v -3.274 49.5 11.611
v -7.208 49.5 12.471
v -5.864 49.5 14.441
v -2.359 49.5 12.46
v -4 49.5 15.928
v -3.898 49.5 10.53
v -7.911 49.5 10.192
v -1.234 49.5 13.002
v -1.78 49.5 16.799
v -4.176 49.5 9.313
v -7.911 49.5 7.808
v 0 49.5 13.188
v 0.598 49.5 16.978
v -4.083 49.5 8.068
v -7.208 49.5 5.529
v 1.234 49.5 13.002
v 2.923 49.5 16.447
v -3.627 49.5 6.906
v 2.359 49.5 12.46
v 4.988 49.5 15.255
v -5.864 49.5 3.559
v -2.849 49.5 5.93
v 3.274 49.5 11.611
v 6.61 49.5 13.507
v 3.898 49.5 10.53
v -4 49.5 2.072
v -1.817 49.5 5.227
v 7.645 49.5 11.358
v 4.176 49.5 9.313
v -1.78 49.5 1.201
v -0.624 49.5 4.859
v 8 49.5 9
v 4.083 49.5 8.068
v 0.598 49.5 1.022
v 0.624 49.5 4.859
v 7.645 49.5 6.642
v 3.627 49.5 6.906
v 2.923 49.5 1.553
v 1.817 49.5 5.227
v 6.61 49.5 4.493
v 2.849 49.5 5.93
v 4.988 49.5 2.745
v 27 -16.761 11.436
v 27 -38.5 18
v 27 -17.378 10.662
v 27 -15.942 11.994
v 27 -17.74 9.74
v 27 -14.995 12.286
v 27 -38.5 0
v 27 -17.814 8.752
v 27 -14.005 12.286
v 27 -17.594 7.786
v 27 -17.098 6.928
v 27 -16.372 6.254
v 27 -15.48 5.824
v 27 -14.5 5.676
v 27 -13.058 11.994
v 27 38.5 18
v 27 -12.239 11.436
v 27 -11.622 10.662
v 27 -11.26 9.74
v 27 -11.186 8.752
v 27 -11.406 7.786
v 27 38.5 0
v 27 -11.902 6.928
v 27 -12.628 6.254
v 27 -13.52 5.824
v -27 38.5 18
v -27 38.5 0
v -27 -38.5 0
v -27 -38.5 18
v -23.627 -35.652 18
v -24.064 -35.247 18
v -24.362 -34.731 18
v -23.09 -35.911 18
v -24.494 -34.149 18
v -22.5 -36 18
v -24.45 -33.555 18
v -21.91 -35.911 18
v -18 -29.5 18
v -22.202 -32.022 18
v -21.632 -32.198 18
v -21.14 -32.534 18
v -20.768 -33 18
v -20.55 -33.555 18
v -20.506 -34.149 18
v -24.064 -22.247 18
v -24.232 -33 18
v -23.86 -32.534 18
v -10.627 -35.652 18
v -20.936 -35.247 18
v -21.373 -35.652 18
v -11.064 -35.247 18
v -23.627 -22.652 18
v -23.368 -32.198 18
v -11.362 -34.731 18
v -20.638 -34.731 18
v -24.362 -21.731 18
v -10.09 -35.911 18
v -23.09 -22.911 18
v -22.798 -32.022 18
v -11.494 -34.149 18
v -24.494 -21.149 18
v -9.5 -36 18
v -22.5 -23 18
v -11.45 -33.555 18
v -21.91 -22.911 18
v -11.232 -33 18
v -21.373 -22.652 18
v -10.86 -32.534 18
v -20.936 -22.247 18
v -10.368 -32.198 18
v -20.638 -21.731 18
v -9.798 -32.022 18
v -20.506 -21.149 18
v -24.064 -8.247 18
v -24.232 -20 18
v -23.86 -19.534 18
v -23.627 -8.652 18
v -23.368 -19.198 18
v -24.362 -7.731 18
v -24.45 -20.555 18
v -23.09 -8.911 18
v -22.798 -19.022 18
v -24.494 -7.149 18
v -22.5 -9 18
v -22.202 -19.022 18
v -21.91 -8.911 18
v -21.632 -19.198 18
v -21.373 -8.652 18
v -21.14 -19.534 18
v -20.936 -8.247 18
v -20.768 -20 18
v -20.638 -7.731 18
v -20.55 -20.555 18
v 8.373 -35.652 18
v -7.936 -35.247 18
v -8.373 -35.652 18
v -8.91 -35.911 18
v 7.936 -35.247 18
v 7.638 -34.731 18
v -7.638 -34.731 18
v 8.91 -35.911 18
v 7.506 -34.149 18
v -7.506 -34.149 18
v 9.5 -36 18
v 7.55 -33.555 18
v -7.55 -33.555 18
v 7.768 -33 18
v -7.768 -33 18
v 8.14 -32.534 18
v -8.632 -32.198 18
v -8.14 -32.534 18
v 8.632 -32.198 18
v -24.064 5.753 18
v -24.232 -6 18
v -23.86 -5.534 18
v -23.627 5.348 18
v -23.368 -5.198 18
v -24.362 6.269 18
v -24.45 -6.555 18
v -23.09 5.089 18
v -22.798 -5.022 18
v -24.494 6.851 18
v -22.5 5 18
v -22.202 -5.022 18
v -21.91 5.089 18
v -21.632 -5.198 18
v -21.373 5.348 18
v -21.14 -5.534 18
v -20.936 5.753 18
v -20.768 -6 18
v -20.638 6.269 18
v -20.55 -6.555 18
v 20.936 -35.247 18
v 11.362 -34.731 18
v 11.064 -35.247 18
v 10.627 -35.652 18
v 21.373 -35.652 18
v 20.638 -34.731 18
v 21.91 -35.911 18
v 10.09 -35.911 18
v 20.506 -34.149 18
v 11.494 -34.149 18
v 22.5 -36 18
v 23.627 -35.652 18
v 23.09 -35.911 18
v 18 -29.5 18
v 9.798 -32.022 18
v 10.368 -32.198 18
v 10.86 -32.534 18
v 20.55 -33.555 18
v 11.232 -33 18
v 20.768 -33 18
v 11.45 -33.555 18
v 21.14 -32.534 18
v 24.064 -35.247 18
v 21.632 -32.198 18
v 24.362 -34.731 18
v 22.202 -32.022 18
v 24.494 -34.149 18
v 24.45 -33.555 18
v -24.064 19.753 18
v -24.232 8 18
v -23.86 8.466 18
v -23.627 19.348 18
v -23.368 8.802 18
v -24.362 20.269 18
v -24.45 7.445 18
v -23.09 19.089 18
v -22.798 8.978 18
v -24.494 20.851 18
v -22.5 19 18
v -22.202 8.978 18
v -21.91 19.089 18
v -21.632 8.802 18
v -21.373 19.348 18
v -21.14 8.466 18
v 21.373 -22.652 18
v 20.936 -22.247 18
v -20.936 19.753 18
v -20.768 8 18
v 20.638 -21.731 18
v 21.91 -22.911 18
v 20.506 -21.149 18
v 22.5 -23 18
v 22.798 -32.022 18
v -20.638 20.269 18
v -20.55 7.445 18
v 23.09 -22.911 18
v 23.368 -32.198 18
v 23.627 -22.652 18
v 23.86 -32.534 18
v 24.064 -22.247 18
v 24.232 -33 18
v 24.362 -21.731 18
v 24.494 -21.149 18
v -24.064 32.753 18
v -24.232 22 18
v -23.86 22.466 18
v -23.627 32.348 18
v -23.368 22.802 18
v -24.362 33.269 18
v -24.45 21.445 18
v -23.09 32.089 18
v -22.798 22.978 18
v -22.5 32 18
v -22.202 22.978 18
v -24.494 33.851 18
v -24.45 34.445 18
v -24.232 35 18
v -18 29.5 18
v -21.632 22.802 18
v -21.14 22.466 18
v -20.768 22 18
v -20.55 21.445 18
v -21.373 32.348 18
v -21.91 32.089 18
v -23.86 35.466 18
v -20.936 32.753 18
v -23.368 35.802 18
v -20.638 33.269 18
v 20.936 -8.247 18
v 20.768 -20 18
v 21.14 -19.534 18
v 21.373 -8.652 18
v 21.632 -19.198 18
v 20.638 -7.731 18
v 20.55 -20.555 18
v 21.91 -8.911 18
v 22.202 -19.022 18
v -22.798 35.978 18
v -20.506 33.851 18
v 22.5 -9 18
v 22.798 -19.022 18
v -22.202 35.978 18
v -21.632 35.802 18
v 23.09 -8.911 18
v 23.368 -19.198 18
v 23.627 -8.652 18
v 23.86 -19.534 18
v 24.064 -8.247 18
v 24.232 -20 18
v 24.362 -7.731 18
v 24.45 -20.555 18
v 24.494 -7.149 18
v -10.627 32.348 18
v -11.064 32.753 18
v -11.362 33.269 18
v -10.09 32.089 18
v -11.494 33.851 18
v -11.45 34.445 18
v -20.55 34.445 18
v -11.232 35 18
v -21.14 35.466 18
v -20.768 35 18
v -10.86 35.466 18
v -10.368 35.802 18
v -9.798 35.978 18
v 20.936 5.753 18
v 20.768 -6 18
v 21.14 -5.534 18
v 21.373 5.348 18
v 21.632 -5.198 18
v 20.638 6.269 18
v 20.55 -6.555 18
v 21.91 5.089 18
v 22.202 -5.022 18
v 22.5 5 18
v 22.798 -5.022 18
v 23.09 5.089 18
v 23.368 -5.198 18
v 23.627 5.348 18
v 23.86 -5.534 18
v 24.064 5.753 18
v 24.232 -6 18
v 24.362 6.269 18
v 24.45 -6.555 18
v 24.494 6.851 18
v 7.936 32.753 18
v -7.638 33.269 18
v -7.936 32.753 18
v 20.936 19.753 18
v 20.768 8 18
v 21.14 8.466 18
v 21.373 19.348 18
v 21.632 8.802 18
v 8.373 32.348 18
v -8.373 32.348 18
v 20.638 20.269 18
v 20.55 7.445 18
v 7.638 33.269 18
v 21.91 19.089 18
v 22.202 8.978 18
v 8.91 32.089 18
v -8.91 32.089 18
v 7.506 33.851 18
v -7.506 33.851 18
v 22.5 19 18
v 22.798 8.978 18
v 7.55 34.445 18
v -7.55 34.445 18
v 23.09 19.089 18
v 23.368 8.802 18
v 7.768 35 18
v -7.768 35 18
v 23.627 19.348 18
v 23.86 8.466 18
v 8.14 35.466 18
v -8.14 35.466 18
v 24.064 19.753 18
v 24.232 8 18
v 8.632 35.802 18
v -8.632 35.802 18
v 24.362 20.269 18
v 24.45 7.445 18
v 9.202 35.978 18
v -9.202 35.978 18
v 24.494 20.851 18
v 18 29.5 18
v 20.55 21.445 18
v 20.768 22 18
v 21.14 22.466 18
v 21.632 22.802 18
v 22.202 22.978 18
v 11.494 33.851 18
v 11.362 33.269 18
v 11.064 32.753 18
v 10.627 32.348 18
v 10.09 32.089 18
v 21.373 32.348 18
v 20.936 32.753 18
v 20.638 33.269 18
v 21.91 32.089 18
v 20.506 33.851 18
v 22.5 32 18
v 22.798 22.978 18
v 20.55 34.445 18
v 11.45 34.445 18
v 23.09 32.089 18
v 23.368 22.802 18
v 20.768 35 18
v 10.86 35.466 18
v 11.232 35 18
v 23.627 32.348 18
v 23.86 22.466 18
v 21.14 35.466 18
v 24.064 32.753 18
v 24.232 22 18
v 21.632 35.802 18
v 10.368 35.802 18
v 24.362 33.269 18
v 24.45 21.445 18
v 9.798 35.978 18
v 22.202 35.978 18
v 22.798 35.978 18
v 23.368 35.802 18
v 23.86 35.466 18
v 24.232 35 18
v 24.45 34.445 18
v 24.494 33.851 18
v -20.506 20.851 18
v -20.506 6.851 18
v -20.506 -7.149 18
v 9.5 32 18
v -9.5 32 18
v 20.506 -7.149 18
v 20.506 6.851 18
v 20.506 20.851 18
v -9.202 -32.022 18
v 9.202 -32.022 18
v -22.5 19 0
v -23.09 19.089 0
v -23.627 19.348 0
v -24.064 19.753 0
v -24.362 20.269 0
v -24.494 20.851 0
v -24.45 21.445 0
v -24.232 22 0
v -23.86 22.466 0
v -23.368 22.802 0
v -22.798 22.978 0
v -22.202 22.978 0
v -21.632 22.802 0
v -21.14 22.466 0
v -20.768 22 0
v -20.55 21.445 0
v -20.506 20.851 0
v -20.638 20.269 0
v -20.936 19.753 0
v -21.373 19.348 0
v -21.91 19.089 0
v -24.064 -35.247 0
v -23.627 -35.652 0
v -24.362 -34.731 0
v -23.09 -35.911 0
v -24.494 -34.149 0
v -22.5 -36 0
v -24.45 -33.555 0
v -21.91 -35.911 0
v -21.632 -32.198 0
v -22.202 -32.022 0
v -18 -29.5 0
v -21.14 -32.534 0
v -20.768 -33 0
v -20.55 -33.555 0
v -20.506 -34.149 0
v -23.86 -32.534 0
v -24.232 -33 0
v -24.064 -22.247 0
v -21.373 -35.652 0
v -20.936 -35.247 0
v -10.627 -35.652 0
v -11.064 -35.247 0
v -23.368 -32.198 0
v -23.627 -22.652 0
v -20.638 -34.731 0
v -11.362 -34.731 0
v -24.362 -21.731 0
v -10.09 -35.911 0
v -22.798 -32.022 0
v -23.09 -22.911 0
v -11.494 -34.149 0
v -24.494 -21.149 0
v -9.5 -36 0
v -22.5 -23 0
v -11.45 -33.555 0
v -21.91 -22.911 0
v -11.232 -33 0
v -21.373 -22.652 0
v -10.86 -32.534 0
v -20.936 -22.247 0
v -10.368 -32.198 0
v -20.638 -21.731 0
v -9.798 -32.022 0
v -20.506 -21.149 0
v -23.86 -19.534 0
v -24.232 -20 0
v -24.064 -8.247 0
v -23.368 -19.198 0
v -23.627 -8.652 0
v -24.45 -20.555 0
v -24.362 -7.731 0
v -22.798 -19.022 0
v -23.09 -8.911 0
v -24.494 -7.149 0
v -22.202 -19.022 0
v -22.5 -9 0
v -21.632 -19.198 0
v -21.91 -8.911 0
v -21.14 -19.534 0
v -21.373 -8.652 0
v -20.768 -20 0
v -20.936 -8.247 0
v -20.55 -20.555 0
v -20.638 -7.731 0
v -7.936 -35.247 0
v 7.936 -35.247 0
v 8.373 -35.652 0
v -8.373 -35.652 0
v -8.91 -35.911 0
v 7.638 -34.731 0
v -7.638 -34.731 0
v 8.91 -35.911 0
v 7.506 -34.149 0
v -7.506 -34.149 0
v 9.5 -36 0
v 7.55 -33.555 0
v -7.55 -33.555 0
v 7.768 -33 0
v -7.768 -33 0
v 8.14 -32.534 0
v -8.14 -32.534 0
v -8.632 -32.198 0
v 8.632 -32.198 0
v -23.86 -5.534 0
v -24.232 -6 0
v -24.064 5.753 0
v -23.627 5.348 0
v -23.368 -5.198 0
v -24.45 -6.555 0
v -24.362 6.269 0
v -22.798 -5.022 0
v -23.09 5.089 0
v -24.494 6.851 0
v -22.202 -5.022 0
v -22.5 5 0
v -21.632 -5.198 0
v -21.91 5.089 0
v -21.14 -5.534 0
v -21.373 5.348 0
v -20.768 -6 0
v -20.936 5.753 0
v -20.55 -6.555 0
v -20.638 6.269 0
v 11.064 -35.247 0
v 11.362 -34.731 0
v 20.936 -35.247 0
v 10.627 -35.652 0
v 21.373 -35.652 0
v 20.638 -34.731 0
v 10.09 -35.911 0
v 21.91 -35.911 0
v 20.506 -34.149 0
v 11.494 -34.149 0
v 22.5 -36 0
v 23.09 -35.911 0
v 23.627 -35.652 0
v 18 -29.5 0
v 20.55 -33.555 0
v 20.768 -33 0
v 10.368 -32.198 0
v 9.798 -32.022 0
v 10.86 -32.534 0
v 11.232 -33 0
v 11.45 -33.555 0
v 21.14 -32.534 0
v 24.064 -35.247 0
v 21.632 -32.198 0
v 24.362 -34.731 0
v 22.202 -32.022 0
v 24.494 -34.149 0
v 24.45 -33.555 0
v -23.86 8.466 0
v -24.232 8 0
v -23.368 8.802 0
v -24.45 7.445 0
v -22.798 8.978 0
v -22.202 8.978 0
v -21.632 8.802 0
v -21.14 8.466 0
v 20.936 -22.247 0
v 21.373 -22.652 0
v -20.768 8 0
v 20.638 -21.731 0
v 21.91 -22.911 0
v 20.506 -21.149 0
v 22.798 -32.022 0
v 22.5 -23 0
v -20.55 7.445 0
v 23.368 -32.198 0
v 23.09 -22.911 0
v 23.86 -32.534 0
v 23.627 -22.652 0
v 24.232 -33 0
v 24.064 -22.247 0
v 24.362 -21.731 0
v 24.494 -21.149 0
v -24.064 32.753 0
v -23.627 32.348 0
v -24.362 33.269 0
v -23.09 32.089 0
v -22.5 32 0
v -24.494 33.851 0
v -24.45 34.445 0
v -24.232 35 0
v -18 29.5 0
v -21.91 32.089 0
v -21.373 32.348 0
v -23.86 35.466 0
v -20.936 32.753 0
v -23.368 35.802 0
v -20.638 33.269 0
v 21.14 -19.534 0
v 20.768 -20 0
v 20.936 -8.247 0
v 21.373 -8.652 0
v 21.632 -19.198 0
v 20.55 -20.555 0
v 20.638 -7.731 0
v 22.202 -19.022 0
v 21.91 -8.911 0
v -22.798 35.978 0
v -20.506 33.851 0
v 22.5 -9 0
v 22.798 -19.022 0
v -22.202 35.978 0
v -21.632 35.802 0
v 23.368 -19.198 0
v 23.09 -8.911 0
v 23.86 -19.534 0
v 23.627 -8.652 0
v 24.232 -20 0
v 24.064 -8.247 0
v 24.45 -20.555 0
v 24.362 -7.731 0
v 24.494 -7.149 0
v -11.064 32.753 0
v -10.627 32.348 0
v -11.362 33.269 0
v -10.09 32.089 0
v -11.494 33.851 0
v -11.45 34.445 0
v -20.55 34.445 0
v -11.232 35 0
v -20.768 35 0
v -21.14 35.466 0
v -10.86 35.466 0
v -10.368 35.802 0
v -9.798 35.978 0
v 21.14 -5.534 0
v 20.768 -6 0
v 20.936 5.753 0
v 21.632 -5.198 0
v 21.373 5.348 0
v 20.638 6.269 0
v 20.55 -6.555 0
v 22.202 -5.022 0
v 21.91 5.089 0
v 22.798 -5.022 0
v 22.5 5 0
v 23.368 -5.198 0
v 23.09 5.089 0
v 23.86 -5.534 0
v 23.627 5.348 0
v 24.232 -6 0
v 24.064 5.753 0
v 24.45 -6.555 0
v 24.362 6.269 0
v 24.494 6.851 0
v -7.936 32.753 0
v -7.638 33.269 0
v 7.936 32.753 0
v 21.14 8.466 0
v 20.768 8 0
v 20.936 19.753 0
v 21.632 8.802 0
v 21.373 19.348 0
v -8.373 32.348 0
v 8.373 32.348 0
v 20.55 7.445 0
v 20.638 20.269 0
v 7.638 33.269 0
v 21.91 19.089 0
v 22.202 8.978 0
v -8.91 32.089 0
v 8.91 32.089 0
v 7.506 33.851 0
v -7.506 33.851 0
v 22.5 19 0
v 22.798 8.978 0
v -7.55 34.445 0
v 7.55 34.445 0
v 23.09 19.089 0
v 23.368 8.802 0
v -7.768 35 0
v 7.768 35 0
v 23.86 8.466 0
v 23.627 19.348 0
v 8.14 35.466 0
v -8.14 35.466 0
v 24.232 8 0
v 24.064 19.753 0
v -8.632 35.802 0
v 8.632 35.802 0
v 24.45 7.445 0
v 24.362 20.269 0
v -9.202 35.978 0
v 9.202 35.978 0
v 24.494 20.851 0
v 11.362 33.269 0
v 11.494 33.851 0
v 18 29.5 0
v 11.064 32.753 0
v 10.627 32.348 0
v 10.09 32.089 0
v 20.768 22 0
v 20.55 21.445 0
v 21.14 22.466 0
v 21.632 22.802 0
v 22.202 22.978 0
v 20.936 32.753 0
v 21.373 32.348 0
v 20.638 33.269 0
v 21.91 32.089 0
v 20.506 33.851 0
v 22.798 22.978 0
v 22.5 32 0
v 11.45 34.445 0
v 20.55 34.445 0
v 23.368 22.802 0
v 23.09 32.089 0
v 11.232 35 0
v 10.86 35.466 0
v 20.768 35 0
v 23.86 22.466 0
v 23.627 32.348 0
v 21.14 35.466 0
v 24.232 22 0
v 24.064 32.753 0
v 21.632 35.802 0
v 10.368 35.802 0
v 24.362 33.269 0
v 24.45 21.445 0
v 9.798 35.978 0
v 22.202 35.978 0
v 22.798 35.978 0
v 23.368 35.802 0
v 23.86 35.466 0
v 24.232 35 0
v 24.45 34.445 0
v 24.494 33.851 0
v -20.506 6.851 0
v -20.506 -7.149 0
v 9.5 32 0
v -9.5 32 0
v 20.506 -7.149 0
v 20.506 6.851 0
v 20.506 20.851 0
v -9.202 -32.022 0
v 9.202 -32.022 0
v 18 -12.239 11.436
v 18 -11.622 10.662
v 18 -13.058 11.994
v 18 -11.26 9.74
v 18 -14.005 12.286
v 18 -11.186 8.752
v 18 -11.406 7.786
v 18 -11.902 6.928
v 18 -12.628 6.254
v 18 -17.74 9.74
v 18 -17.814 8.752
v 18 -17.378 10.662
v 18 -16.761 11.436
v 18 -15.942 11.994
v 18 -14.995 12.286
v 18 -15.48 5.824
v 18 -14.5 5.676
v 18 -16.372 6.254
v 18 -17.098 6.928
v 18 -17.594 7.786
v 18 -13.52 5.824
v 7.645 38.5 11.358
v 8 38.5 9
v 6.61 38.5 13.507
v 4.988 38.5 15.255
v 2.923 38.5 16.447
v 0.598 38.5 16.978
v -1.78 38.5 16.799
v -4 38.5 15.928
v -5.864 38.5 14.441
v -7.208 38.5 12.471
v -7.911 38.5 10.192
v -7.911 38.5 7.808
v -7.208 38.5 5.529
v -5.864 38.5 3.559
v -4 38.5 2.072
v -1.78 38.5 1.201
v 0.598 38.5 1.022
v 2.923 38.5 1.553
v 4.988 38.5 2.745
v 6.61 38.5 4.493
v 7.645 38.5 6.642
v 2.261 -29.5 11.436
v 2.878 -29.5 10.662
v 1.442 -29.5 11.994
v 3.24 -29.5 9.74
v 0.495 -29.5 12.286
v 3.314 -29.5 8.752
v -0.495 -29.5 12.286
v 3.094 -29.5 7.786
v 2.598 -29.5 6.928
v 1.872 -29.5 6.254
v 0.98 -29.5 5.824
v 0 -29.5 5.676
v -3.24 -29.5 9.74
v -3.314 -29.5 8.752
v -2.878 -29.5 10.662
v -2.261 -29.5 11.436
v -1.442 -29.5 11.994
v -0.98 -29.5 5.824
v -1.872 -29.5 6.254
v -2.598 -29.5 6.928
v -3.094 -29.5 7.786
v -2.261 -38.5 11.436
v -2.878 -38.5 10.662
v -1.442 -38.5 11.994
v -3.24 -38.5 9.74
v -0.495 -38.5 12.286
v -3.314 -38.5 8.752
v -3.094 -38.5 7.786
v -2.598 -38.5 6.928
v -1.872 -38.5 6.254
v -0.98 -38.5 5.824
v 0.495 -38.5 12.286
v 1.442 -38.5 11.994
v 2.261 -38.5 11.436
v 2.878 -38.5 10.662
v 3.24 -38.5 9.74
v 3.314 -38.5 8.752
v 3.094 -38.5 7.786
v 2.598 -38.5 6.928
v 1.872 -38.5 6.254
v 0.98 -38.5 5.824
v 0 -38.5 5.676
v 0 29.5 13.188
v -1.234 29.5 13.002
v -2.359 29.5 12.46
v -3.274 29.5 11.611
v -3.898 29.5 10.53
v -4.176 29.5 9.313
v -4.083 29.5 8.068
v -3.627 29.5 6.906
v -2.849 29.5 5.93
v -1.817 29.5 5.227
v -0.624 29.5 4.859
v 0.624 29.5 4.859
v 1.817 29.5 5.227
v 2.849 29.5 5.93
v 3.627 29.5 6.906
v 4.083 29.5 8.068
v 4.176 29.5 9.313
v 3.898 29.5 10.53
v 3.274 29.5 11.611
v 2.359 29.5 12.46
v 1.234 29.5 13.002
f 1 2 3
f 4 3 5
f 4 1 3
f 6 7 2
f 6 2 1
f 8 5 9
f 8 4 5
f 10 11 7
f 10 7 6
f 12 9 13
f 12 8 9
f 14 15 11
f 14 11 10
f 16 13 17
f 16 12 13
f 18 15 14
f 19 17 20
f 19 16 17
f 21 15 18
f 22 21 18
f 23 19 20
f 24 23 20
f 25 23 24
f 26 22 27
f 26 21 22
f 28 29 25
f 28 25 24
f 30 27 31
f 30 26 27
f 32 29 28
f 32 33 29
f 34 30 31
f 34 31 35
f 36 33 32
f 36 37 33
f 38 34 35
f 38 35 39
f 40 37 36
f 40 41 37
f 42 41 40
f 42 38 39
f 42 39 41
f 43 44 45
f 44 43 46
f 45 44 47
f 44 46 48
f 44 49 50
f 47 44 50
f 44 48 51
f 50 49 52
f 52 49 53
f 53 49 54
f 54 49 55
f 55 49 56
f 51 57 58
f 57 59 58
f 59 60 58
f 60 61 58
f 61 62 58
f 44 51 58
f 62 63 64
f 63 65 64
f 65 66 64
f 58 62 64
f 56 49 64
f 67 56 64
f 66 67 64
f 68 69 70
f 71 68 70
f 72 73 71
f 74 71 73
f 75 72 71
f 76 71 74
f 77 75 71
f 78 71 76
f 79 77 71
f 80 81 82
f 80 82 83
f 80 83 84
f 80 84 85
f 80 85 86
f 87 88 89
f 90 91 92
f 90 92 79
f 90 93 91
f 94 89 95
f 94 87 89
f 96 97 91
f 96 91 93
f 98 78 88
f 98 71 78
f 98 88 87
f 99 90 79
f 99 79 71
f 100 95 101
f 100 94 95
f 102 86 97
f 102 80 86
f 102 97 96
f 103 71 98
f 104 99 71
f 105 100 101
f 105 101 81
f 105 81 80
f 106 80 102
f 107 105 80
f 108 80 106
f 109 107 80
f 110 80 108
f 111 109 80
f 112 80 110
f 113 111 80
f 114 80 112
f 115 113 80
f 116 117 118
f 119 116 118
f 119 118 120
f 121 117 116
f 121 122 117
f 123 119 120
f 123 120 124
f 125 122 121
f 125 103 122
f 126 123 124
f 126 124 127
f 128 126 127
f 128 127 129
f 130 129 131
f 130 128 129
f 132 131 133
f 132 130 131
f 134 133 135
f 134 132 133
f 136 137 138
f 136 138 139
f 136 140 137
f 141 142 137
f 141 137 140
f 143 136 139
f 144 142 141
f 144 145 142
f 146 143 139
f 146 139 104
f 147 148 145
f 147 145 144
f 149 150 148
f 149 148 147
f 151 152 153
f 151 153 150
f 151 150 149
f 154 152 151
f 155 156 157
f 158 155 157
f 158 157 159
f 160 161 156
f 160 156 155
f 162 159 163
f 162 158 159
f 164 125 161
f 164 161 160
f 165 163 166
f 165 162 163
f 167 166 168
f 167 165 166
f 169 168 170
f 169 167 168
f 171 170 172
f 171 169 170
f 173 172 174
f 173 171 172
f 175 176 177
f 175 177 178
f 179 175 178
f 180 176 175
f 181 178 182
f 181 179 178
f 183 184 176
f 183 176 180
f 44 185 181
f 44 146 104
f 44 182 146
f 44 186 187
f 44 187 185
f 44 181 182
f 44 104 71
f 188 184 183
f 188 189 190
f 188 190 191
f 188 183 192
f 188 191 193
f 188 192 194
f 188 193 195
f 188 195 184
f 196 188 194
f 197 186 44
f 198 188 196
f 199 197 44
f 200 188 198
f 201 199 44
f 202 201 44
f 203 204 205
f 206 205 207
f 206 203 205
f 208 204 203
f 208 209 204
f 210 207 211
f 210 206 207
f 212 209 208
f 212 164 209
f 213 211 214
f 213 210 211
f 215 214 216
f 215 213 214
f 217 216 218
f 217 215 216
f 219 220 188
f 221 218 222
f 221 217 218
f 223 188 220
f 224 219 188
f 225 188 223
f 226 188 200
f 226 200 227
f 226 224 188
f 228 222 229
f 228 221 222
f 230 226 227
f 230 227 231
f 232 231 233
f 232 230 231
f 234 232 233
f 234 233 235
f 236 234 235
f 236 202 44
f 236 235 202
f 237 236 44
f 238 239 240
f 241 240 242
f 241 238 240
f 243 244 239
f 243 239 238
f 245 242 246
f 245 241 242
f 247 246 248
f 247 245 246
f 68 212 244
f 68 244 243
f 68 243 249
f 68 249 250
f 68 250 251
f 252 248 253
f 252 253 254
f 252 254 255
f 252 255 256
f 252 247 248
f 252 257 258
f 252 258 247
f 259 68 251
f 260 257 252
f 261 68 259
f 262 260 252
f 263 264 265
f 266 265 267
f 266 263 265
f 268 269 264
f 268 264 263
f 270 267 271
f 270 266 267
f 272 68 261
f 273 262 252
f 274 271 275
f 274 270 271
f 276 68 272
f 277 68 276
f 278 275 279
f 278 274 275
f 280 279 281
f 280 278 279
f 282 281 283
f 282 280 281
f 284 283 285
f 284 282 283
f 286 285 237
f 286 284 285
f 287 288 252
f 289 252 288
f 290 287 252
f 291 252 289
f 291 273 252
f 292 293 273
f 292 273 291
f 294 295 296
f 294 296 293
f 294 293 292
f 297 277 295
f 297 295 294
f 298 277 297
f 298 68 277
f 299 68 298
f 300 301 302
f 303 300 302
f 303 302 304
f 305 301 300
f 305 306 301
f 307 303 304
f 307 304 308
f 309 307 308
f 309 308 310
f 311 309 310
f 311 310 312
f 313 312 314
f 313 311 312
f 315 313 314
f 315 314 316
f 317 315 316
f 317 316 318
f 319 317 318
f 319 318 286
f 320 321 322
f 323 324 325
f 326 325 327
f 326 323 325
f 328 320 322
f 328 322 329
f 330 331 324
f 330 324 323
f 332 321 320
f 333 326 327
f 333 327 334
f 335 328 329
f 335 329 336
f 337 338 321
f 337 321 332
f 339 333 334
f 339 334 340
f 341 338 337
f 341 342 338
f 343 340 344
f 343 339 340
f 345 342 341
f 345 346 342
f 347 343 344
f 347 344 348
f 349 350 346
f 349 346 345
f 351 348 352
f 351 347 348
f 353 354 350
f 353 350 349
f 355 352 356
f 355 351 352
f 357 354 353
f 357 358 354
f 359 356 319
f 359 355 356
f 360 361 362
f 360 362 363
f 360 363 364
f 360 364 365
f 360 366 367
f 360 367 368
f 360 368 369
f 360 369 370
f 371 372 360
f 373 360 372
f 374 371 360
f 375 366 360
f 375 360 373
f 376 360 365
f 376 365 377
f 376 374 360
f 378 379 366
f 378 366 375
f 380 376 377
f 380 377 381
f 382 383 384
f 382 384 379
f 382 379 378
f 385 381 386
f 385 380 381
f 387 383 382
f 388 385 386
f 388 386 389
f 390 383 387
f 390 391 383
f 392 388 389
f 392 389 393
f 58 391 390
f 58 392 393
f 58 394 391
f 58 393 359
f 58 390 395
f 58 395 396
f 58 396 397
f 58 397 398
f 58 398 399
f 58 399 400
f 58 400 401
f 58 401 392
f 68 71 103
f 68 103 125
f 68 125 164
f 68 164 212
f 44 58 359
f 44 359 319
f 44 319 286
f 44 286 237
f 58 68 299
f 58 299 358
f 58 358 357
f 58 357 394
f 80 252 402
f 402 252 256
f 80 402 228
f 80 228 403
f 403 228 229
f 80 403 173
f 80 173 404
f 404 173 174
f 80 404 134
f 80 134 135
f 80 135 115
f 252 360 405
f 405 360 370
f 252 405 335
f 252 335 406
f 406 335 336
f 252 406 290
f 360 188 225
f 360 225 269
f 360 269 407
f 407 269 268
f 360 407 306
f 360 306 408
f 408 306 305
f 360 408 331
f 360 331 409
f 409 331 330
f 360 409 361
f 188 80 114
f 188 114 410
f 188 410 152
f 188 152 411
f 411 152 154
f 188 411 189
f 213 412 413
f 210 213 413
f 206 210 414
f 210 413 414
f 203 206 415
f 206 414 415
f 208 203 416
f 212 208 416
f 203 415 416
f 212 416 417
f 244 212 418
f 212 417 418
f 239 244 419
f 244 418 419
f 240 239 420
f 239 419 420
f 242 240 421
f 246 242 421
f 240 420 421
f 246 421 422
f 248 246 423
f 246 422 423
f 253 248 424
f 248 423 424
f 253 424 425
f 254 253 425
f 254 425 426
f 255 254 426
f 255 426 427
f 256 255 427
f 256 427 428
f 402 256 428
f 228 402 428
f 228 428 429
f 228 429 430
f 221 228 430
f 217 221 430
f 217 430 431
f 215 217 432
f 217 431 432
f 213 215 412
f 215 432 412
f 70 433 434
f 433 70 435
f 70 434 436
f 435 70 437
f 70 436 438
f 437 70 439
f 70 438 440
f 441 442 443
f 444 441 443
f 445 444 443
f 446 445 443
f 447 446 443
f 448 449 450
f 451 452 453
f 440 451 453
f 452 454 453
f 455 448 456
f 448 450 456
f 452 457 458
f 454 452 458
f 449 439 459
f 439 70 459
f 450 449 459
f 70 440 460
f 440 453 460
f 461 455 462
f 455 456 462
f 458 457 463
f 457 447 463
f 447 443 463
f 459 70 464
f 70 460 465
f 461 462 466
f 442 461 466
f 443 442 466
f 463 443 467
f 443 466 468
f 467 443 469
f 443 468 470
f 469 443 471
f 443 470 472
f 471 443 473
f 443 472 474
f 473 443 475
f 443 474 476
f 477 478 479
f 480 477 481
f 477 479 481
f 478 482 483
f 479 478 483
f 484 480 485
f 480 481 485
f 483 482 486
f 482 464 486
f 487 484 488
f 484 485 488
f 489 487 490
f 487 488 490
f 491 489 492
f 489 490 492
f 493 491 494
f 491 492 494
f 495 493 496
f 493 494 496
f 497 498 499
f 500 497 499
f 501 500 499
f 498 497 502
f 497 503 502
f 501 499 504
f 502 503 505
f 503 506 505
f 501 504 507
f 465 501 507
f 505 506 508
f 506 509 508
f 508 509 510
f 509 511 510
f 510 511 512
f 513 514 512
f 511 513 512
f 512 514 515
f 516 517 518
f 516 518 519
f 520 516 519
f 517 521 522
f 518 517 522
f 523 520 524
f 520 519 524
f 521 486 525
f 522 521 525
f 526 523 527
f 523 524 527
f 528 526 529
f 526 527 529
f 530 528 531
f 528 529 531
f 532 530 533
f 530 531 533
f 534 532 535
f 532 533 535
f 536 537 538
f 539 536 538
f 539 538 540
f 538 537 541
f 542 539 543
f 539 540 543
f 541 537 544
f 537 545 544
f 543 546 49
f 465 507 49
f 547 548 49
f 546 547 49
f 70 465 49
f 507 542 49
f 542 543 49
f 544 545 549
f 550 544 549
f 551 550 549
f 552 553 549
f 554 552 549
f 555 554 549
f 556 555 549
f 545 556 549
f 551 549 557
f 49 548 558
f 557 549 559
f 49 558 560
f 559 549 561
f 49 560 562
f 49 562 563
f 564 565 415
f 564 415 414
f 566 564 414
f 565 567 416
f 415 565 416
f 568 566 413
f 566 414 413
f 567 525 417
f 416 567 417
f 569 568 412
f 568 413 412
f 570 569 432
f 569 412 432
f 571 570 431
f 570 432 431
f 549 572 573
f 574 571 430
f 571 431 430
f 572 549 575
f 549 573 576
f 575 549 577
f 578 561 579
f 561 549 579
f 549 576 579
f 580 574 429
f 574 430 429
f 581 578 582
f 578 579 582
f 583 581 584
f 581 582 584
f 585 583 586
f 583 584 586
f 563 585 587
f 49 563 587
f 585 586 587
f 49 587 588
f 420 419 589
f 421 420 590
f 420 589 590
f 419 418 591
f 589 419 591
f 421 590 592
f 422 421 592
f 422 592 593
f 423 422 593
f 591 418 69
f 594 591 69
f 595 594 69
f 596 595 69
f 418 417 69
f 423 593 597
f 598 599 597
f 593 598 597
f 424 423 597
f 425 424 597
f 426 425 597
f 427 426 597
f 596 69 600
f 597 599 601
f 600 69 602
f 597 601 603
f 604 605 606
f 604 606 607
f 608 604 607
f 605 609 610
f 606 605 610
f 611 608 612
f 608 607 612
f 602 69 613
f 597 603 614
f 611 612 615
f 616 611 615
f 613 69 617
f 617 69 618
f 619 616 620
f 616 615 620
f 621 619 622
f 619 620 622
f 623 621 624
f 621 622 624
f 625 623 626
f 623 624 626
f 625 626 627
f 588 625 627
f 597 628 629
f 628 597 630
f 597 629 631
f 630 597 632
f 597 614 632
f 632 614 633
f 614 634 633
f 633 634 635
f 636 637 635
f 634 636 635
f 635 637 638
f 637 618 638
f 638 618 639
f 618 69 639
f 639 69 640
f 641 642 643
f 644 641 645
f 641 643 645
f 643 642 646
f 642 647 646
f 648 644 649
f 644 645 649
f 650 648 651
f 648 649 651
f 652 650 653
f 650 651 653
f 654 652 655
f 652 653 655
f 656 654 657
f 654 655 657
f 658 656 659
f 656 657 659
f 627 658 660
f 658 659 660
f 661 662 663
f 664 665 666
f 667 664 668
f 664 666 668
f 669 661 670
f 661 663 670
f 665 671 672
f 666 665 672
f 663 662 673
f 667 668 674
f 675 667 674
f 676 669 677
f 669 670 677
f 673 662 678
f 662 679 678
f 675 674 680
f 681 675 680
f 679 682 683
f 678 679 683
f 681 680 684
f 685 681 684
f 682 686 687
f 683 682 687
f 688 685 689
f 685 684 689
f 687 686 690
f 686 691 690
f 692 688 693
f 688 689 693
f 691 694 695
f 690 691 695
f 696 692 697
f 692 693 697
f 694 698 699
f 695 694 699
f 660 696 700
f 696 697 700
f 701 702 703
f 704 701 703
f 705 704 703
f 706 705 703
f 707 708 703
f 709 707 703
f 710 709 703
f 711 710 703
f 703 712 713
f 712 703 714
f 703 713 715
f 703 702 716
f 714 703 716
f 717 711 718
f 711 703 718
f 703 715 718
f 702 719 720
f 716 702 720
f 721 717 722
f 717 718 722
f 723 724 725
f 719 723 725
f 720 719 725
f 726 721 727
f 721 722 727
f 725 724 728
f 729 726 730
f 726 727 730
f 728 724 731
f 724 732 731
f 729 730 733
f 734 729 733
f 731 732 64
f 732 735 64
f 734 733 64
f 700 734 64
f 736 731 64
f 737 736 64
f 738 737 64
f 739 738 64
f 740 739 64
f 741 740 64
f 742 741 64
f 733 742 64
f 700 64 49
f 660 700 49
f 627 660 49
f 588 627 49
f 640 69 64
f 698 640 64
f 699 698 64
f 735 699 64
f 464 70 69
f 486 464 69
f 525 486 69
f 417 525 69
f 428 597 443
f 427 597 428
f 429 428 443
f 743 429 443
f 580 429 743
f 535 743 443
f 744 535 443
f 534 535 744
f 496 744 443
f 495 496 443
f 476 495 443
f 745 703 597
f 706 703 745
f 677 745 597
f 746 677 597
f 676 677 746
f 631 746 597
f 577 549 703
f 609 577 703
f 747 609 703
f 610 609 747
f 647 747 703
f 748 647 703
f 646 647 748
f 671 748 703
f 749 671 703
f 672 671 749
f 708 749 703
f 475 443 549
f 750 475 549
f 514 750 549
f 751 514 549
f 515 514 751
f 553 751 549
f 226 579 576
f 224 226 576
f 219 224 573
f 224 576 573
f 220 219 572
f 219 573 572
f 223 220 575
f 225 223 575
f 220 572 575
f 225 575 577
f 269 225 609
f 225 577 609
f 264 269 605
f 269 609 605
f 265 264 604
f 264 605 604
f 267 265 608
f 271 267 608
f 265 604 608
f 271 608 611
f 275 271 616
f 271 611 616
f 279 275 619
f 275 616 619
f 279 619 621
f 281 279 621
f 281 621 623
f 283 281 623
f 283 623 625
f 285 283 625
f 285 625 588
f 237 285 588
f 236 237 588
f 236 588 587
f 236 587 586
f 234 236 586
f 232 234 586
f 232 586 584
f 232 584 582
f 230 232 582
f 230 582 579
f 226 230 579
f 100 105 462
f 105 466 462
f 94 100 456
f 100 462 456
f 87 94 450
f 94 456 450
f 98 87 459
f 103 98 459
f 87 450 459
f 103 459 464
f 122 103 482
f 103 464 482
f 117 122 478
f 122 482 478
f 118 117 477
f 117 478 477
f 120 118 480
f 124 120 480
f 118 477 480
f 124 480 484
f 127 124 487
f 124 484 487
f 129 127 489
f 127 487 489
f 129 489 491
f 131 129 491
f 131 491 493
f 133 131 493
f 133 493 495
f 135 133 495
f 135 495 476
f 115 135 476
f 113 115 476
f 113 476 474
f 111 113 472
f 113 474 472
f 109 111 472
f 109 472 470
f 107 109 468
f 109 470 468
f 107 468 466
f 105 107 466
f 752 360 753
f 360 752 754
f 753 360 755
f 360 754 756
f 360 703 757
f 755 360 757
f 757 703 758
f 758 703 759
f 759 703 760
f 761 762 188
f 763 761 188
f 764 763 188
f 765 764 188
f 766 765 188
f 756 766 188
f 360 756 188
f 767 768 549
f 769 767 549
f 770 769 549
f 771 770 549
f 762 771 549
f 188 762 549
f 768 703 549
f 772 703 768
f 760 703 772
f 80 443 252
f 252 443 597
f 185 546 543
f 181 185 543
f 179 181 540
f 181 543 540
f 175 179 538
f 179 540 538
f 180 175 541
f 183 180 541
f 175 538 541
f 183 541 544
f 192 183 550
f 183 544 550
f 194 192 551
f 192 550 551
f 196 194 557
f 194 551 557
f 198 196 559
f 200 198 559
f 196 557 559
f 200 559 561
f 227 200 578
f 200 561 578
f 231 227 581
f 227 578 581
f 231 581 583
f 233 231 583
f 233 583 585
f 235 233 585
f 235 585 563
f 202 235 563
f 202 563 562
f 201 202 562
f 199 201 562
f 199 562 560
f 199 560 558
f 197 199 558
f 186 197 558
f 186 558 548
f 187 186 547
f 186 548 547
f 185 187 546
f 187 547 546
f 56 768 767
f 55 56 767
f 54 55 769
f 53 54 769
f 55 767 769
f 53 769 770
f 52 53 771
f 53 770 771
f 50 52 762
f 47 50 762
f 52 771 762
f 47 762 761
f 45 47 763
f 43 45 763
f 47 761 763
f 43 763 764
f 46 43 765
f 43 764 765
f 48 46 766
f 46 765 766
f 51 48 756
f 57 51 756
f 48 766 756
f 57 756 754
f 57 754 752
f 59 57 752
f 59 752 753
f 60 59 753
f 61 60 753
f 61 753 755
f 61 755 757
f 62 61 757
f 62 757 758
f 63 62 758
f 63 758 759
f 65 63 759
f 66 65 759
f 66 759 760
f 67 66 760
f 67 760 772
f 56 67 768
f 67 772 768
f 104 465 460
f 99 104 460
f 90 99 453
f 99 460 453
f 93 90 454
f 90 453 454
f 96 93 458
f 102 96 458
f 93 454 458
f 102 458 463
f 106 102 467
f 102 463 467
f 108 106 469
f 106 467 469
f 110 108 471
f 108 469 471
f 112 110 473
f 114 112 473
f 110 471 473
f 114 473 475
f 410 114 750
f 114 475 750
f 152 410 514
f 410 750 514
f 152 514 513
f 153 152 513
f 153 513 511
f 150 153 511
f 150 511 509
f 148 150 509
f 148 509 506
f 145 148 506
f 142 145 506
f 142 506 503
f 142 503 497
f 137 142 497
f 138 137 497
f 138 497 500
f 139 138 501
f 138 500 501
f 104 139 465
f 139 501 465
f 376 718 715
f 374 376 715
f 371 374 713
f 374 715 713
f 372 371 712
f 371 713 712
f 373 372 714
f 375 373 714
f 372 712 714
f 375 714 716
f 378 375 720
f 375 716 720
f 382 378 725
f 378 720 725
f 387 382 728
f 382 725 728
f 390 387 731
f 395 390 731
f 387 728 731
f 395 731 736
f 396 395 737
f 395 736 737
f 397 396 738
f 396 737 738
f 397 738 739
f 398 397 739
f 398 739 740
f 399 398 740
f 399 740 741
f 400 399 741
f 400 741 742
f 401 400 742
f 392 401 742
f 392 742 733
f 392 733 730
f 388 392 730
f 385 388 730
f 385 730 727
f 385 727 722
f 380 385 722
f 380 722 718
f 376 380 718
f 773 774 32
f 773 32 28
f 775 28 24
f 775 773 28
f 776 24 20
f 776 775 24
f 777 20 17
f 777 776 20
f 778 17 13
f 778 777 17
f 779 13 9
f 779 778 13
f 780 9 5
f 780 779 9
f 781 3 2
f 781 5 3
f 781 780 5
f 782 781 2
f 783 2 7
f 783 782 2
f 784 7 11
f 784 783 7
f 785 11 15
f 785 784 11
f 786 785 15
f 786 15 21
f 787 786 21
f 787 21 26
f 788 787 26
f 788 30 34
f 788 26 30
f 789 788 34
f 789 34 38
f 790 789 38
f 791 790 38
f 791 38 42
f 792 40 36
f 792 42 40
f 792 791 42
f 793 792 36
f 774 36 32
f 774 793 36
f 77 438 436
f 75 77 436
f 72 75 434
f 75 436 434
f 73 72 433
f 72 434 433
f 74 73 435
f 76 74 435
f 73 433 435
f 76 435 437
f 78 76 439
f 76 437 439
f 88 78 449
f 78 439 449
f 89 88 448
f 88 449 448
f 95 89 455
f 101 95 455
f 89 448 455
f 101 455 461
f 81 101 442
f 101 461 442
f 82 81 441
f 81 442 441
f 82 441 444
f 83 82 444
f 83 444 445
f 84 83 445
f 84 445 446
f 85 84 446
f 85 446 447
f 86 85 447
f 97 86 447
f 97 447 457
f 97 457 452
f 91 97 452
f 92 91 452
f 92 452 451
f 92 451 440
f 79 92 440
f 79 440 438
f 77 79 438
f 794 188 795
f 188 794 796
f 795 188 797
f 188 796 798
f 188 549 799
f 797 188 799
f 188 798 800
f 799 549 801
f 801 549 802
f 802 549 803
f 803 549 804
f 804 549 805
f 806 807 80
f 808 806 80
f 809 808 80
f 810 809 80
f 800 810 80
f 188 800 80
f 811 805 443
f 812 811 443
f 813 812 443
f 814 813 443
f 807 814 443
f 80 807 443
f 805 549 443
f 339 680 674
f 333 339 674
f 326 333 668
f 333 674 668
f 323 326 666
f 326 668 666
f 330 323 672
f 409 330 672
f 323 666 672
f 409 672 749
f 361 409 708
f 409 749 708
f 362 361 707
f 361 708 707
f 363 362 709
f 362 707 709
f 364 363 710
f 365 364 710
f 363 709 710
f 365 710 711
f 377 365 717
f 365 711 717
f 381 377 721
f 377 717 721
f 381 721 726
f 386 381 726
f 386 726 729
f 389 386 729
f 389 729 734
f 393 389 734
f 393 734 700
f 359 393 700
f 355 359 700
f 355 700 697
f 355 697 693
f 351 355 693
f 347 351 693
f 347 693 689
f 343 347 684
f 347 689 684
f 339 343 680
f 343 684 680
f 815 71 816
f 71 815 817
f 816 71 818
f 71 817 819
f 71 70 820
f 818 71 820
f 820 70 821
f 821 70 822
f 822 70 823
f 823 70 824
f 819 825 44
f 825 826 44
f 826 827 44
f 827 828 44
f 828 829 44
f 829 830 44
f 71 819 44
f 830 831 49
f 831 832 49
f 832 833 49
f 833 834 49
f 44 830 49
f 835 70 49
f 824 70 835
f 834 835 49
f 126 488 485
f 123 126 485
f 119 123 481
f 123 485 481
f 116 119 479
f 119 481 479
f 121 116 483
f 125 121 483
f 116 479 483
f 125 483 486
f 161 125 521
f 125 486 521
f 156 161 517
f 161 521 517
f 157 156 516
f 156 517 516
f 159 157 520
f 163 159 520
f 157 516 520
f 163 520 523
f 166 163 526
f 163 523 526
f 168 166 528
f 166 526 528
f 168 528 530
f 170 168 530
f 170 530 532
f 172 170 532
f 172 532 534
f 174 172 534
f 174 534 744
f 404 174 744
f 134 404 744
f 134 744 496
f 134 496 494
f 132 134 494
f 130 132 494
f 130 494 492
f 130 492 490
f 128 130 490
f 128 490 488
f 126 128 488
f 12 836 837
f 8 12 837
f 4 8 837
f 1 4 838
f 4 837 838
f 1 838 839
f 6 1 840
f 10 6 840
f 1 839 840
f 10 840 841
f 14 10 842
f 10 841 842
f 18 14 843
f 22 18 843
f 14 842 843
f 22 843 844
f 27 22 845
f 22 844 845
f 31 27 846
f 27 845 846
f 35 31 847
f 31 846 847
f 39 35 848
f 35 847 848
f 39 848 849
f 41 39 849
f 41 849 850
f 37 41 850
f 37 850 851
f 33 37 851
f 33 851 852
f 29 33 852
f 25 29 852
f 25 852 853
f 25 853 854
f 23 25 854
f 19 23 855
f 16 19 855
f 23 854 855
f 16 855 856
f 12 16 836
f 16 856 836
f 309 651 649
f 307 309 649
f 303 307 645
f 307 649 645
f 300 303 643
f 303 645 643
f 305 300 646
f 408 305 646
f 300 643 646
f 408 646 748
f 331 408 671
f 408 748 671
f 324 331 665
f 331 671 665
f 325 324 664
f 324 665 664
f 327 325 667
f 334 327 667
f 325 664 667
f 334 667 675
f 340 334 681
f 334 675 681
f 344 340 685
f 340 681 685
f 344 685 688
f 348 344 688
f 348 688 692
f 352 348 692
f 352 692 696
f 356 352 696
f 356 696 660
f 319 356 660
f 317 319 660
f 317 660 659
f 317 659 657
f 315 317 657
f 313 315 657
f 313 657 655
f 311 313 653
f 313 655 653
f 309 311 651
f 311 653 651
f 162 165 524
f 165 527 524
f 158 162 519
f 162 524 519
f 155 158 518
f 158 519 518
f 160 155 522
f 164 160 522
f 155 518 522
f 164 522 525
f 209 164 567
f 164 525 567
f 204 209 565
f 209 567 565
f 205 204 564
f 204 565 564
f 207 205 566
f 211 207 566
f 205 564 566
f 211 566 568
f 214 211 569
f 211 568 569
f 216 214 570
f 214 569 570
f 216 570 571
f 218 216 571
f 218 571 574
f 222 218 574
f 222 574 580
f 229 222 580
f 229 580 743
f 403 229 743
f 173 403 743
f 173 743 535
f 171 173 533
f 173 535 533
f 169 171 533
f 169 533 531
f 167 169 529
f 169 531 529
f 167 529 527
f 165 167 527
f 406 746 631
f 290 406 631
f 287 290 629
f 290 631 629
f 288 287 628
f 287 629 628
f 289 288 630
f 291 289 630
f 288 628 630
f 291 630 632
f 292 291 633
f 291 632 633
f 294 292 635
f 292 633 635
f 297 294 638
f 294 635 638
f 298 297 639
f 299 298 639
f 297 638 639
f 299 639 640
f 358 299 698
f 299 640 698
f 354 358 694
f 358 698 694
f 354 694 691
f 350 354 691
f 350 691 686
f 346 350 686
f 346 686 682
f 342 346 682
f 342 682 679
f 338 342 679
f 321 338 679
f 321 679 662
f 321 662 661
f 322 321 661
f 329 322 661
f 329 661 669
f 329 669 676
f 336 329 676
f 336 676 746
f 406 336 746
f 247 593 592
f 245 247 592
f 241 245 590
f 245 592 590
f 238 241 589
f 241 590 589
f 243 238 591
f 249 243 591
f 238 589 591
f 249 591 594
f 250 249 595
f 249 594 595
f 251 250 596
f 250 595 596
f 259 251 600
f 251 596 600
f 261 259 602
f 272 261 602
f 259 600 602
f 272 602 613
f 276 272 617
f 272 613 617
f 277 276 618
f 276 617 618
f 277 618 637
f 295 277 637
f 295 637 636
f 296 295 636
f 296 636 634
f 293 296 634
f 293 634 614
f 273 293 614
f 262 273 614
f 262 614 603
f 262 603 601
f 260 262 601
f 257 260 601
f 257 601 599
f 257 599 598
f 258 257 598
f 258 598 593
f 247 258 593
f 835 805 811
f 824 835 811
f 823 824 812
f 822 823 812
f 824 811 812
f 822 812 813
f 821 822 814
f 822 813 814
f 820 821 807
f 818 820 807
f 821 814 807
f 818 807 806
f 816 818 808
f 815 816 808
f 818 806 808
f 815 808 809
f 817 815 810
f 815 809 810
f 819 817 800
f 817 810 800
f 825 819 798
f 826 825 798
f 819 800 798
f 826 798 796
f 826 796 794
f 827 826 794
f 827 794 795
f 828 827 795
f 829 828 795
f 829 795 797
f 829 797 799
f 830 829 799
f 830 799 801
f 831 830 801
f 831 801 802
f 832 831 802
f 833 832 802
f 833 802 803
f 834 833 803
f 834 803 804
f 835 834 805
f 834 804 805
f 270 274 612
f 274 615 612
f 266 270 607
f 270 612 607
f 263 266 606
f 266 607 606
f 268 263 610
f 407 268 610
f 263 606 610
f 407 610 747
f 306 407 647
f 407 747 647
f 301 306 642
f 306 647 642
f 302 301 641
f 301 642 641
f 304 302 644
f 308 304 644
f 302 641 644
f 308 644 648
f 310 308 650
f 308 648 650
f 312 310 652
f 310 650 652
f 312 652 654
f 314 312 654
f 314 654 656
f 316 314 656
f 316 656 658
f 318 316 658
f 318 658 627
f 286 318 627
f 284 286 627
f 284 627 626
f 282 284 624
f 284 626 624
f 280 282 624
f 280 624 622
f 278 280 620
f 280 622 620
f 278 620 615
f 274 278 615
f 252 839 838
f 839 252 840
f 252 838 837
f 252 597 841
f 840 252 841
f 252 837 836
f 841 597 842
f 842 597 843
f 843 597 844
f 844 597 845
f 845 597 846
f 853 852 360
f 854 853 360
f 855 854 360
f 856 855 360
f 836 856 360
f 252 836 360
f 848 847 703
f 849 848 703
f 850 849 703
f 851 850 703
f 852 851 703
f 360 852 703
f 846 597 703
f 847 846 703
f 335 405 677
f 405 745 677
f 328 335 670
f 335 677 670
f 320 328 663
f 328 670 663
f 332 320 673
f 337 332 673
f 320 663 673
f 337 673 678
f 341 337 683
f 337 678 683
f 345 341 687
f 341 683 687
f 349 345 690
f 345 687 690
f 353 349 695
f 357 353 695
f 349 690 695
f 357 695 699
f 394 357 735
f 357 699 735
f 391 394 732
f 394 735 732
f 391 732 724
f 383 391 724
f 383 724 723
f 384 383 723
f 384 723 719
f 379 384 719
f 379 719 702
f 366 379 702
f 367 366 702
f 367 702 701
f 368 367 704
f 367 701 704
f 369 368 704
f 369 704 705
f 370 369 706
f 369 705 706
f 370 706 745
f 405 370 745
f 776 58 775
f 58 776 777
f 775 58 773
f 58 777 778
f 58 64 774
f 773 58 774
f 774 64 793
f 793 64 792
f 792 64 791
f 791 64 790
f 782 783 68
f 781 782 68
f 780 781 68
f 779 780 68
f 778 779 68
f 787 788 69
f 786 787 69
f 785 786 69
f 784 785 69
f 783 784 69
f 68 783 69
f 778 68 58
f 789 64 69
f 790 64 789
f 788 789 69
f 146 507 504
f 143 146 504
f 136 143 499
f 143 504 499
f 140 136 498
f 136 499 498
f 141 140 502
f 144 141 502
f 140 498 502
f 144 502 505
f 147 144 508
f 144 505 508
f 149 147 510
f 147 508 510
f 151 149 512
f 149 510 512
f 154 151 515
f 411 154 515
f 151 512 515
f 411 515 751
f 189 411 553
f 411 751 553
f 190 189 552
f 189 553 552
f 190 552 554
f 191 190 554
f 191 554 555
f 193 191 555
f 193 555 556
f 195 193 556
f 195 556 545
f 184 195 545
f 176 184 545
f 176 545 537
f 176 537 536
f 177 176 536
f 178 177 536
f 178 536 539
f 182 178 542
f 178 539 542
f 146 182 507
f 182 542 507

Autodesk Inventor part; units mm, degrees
ref_plane "YZ Plane" through (0, 0, 0) normal (1, 0, 0) x (0, 1, 0)
ref_plane "XZ Plane" through (0, 0, 0) normal (0, 1, 0) x (-1, 0, 0)
ref_plane "XY Plane" through (0, 0, 0) normal (0, 0, 1) x (1, 0, 0)
sketch "Sketch1" plane through (0, 0, 0) normal (0, 0, 1) x (1, 0, 0)
  line L0 (27, 38.5) -> (-27, 38.5)
  line L1 (-27, 38.5) -> (-27, -38.5)
  line L2 (-27, -38.5) -> (27, -38.5)
  line L3 (27, -38.5) -> (27, 38.5)
  line L4 (27, 38.5) -> (-27, -38.5) construction
  line L5 (-27, 38.5) -> (27, -38.5) construction
  line L6 (-18, 29.5) -> (18, 29.5)
  line L7 (18, 29.5) -> (18, -29.5)
  line L8 (18, -29.5) -> (-18, -29.5)
  line L9 (-18, -29.5) -> (-18, 29.5)
  line L10 (0, 57.4351) -> (0, -57.4351)
  point P0 (0, 0)
  point P1 (0, 0)
  dimension "d0" = 77
  dimension "d1" = 54
  dimension "d2" = 59
  dimension "d3" = 36
  dimension "d4" = 18
  dimension "d5" = 29.5
extrude "Extrusion1" add sketch "Sketch1" along normal blind 18 contours L3 L2 L10 L8 L7 L6 L0 | L10 L6 L9 L8 L2 L1 L0
sketch "Sketch2" plane through (0, 0, 18) normal (0, 0, 1) x (1, 0, 0)
  line L0 (27, -38.5) -> (27, 38.5) projected
  line L1 (27, 38.5) -> (-27, 38.5) projected
  line L2 (-27, 38.5) -> (-27, -38.5) projected
  line L3 (-27, -38.5) -> (27, -38.5) projected
  line L4 (18, -29.5) -> (-18, -29.5) projected
  line L5 (-18, -29.5) -> (-18, 29.5) projected
  line L6 (-18, 29.5) -> (18, 29.5) projected
  line L7 (18, 29.5) -> (18, -29.5) projected
  line L8 (-27, 0) -> (26, 0)
  line L9 (0, 38.5) -> (0, -38.5)
  point P0 (0, 0)
  point P1 (-9.5, 34)
  point P2 (9.5, 34)
  point P3 (22.5, 34)
  point P4 (-22.5, 34)
  point P5 (-22.5, 21)
  point P6 (-22.5, 7)
  point P7 (-22.5, -7)
  point P8 (-22.5, -21)
  point P9 (-22.5, -34)
  point P10 (-9.5, -34)
  point P11 (9.5, -34)
  point P12 (22.5, -34)
  point P13 (-0.5, 0)
  point P14 (22.5, 21)
  point P15 (22.5, 7)
  point P16 (22.5, -7)
  point P17 (22.5, -21)
  dimension "d11" = 4.5
  dimension "d14" = 19
  dimension "d15" = 4.5
  dimension "d16" = 13
  dimension "d17" = 4.5
  dimension "d18" = 4.5
  dimension "d19" = 4.5
  dimension "d20" = 13
  dimension "d21" = 4.5
  dimension "d22" = 13
  dimension "d23" = 14
  dimension "d24" = 4.5
  dimension "d25" = 14
  dimension "d26" = 4.5
  dimension "d27" = 4.5
  dimension "d28" = 14
  dimension "d29" = 13
  dimension "d30" = 4.5
hole "Hole1" at (-9.5, 34, 18) at (9.5, 34, 18) at (22.5, 34, 18) at (-22.5, 34, 18) at (-22.5, 21, 18) at (-22.5, 7, 18) at (-22.5, -7, 18) at (-22.5, -21, 18) at (-22.5, -34, 18) at (-9.5, -34, 18) at (9.5, -34, 18) at (22.5, -34, 18) at (22.5, 21, 18) at (22.5, 7, 18) at (22.5, -7, 18) at (22.5, -21, 18) direction (0, 0, -1) diameter 4 end through all
sketch "Sketch3" plane through (-27, -38.5, 0) normal (0, -1, 0) x (1, 0, 0)
  line L0 (27, 0) -> (27, 18) construction
  line L1 (0, 18) -> (54, 18) projected
  line L2 (0, 0) -> (0, 18) projected
  line L3 (0, 9) -> (54, 9) construction
  line L4 (54, 0) -> (54, 18) projected
  point P0 (27, 9)
hole "Hole2" at (0, -38.5, 9) direction (0, 1, 0) diameter 6.647 depth 22.2 thread size "M8x1.25" class "6H" standard "ANSI Metric M Profile"
sketch "Sketch4" plane through (-27, 38.5, 0) normal (0, 1, 0) x (1, 0, 0)
  line L0 (27, 0) -> (27, -18) construction
  line L1 (0, -18) -> (54, -18) projected
  line L2 (54, 0) -> (54, -18) projected
  line L3 (54, -9) -> (0, -9) construction
  line L4 (0, 0) -> (0, -18) projected
  circle A0 centre (27, -9) radius 8
  dimension "d45" = 16
extrude "Extrusion2" add sketch "Sketch4" along normal blind 11
sketch "Sketch5" plane through (0, 49.5, 9) normal (0, 1, 0) x (1, 0, 0)
  circle A0 centre (0, 0) radius 3.3235 projected
  circle A1 centre (0, 0) radius 8 projected
  point P0 (0, 9)
hole "Hole3" at (0, 49.5, 9) direction (0, -1, 0) diameter 8.376 depth 27.3 thread size "M10x1.5" class "6H" standard "ANSI Metric M Profile"
sketch "Sketch6" plane through (27, -38.5, 0) normal (1, 0, 0) x (0, 0, -1)
  line L0 (0, 0) -> (0, 77) projected
  line L1 (0, 0) -> (0, 77) projected
  line L2 (0, 77) -> (-18, 77) projected
  line L3 (-18, 0) -> (-18, 77) projected
  line L4 (0, 0) -> (-18, 0) projected
  line L5 (0, 29.5) -> (-18, 29.5) projected
  line L6 (0, 19.5) -> (-18, 19.5) projected
  line L7 (0, 9) -> (-18, 9) projected
  line L8 (-9, 0) -> (-9, 77) construction
  point P0 (0, 38.5)
  point P1 (-9, 24)
hole "Hole4" at (27, -14.5, 9) direction (-1, 0, 0) diameter 6.647 depth 22.2 thread size "M8x1.25" class "6H" standard "ANSI Metric M Profile"
properties part number "HUDSON-1-32"
